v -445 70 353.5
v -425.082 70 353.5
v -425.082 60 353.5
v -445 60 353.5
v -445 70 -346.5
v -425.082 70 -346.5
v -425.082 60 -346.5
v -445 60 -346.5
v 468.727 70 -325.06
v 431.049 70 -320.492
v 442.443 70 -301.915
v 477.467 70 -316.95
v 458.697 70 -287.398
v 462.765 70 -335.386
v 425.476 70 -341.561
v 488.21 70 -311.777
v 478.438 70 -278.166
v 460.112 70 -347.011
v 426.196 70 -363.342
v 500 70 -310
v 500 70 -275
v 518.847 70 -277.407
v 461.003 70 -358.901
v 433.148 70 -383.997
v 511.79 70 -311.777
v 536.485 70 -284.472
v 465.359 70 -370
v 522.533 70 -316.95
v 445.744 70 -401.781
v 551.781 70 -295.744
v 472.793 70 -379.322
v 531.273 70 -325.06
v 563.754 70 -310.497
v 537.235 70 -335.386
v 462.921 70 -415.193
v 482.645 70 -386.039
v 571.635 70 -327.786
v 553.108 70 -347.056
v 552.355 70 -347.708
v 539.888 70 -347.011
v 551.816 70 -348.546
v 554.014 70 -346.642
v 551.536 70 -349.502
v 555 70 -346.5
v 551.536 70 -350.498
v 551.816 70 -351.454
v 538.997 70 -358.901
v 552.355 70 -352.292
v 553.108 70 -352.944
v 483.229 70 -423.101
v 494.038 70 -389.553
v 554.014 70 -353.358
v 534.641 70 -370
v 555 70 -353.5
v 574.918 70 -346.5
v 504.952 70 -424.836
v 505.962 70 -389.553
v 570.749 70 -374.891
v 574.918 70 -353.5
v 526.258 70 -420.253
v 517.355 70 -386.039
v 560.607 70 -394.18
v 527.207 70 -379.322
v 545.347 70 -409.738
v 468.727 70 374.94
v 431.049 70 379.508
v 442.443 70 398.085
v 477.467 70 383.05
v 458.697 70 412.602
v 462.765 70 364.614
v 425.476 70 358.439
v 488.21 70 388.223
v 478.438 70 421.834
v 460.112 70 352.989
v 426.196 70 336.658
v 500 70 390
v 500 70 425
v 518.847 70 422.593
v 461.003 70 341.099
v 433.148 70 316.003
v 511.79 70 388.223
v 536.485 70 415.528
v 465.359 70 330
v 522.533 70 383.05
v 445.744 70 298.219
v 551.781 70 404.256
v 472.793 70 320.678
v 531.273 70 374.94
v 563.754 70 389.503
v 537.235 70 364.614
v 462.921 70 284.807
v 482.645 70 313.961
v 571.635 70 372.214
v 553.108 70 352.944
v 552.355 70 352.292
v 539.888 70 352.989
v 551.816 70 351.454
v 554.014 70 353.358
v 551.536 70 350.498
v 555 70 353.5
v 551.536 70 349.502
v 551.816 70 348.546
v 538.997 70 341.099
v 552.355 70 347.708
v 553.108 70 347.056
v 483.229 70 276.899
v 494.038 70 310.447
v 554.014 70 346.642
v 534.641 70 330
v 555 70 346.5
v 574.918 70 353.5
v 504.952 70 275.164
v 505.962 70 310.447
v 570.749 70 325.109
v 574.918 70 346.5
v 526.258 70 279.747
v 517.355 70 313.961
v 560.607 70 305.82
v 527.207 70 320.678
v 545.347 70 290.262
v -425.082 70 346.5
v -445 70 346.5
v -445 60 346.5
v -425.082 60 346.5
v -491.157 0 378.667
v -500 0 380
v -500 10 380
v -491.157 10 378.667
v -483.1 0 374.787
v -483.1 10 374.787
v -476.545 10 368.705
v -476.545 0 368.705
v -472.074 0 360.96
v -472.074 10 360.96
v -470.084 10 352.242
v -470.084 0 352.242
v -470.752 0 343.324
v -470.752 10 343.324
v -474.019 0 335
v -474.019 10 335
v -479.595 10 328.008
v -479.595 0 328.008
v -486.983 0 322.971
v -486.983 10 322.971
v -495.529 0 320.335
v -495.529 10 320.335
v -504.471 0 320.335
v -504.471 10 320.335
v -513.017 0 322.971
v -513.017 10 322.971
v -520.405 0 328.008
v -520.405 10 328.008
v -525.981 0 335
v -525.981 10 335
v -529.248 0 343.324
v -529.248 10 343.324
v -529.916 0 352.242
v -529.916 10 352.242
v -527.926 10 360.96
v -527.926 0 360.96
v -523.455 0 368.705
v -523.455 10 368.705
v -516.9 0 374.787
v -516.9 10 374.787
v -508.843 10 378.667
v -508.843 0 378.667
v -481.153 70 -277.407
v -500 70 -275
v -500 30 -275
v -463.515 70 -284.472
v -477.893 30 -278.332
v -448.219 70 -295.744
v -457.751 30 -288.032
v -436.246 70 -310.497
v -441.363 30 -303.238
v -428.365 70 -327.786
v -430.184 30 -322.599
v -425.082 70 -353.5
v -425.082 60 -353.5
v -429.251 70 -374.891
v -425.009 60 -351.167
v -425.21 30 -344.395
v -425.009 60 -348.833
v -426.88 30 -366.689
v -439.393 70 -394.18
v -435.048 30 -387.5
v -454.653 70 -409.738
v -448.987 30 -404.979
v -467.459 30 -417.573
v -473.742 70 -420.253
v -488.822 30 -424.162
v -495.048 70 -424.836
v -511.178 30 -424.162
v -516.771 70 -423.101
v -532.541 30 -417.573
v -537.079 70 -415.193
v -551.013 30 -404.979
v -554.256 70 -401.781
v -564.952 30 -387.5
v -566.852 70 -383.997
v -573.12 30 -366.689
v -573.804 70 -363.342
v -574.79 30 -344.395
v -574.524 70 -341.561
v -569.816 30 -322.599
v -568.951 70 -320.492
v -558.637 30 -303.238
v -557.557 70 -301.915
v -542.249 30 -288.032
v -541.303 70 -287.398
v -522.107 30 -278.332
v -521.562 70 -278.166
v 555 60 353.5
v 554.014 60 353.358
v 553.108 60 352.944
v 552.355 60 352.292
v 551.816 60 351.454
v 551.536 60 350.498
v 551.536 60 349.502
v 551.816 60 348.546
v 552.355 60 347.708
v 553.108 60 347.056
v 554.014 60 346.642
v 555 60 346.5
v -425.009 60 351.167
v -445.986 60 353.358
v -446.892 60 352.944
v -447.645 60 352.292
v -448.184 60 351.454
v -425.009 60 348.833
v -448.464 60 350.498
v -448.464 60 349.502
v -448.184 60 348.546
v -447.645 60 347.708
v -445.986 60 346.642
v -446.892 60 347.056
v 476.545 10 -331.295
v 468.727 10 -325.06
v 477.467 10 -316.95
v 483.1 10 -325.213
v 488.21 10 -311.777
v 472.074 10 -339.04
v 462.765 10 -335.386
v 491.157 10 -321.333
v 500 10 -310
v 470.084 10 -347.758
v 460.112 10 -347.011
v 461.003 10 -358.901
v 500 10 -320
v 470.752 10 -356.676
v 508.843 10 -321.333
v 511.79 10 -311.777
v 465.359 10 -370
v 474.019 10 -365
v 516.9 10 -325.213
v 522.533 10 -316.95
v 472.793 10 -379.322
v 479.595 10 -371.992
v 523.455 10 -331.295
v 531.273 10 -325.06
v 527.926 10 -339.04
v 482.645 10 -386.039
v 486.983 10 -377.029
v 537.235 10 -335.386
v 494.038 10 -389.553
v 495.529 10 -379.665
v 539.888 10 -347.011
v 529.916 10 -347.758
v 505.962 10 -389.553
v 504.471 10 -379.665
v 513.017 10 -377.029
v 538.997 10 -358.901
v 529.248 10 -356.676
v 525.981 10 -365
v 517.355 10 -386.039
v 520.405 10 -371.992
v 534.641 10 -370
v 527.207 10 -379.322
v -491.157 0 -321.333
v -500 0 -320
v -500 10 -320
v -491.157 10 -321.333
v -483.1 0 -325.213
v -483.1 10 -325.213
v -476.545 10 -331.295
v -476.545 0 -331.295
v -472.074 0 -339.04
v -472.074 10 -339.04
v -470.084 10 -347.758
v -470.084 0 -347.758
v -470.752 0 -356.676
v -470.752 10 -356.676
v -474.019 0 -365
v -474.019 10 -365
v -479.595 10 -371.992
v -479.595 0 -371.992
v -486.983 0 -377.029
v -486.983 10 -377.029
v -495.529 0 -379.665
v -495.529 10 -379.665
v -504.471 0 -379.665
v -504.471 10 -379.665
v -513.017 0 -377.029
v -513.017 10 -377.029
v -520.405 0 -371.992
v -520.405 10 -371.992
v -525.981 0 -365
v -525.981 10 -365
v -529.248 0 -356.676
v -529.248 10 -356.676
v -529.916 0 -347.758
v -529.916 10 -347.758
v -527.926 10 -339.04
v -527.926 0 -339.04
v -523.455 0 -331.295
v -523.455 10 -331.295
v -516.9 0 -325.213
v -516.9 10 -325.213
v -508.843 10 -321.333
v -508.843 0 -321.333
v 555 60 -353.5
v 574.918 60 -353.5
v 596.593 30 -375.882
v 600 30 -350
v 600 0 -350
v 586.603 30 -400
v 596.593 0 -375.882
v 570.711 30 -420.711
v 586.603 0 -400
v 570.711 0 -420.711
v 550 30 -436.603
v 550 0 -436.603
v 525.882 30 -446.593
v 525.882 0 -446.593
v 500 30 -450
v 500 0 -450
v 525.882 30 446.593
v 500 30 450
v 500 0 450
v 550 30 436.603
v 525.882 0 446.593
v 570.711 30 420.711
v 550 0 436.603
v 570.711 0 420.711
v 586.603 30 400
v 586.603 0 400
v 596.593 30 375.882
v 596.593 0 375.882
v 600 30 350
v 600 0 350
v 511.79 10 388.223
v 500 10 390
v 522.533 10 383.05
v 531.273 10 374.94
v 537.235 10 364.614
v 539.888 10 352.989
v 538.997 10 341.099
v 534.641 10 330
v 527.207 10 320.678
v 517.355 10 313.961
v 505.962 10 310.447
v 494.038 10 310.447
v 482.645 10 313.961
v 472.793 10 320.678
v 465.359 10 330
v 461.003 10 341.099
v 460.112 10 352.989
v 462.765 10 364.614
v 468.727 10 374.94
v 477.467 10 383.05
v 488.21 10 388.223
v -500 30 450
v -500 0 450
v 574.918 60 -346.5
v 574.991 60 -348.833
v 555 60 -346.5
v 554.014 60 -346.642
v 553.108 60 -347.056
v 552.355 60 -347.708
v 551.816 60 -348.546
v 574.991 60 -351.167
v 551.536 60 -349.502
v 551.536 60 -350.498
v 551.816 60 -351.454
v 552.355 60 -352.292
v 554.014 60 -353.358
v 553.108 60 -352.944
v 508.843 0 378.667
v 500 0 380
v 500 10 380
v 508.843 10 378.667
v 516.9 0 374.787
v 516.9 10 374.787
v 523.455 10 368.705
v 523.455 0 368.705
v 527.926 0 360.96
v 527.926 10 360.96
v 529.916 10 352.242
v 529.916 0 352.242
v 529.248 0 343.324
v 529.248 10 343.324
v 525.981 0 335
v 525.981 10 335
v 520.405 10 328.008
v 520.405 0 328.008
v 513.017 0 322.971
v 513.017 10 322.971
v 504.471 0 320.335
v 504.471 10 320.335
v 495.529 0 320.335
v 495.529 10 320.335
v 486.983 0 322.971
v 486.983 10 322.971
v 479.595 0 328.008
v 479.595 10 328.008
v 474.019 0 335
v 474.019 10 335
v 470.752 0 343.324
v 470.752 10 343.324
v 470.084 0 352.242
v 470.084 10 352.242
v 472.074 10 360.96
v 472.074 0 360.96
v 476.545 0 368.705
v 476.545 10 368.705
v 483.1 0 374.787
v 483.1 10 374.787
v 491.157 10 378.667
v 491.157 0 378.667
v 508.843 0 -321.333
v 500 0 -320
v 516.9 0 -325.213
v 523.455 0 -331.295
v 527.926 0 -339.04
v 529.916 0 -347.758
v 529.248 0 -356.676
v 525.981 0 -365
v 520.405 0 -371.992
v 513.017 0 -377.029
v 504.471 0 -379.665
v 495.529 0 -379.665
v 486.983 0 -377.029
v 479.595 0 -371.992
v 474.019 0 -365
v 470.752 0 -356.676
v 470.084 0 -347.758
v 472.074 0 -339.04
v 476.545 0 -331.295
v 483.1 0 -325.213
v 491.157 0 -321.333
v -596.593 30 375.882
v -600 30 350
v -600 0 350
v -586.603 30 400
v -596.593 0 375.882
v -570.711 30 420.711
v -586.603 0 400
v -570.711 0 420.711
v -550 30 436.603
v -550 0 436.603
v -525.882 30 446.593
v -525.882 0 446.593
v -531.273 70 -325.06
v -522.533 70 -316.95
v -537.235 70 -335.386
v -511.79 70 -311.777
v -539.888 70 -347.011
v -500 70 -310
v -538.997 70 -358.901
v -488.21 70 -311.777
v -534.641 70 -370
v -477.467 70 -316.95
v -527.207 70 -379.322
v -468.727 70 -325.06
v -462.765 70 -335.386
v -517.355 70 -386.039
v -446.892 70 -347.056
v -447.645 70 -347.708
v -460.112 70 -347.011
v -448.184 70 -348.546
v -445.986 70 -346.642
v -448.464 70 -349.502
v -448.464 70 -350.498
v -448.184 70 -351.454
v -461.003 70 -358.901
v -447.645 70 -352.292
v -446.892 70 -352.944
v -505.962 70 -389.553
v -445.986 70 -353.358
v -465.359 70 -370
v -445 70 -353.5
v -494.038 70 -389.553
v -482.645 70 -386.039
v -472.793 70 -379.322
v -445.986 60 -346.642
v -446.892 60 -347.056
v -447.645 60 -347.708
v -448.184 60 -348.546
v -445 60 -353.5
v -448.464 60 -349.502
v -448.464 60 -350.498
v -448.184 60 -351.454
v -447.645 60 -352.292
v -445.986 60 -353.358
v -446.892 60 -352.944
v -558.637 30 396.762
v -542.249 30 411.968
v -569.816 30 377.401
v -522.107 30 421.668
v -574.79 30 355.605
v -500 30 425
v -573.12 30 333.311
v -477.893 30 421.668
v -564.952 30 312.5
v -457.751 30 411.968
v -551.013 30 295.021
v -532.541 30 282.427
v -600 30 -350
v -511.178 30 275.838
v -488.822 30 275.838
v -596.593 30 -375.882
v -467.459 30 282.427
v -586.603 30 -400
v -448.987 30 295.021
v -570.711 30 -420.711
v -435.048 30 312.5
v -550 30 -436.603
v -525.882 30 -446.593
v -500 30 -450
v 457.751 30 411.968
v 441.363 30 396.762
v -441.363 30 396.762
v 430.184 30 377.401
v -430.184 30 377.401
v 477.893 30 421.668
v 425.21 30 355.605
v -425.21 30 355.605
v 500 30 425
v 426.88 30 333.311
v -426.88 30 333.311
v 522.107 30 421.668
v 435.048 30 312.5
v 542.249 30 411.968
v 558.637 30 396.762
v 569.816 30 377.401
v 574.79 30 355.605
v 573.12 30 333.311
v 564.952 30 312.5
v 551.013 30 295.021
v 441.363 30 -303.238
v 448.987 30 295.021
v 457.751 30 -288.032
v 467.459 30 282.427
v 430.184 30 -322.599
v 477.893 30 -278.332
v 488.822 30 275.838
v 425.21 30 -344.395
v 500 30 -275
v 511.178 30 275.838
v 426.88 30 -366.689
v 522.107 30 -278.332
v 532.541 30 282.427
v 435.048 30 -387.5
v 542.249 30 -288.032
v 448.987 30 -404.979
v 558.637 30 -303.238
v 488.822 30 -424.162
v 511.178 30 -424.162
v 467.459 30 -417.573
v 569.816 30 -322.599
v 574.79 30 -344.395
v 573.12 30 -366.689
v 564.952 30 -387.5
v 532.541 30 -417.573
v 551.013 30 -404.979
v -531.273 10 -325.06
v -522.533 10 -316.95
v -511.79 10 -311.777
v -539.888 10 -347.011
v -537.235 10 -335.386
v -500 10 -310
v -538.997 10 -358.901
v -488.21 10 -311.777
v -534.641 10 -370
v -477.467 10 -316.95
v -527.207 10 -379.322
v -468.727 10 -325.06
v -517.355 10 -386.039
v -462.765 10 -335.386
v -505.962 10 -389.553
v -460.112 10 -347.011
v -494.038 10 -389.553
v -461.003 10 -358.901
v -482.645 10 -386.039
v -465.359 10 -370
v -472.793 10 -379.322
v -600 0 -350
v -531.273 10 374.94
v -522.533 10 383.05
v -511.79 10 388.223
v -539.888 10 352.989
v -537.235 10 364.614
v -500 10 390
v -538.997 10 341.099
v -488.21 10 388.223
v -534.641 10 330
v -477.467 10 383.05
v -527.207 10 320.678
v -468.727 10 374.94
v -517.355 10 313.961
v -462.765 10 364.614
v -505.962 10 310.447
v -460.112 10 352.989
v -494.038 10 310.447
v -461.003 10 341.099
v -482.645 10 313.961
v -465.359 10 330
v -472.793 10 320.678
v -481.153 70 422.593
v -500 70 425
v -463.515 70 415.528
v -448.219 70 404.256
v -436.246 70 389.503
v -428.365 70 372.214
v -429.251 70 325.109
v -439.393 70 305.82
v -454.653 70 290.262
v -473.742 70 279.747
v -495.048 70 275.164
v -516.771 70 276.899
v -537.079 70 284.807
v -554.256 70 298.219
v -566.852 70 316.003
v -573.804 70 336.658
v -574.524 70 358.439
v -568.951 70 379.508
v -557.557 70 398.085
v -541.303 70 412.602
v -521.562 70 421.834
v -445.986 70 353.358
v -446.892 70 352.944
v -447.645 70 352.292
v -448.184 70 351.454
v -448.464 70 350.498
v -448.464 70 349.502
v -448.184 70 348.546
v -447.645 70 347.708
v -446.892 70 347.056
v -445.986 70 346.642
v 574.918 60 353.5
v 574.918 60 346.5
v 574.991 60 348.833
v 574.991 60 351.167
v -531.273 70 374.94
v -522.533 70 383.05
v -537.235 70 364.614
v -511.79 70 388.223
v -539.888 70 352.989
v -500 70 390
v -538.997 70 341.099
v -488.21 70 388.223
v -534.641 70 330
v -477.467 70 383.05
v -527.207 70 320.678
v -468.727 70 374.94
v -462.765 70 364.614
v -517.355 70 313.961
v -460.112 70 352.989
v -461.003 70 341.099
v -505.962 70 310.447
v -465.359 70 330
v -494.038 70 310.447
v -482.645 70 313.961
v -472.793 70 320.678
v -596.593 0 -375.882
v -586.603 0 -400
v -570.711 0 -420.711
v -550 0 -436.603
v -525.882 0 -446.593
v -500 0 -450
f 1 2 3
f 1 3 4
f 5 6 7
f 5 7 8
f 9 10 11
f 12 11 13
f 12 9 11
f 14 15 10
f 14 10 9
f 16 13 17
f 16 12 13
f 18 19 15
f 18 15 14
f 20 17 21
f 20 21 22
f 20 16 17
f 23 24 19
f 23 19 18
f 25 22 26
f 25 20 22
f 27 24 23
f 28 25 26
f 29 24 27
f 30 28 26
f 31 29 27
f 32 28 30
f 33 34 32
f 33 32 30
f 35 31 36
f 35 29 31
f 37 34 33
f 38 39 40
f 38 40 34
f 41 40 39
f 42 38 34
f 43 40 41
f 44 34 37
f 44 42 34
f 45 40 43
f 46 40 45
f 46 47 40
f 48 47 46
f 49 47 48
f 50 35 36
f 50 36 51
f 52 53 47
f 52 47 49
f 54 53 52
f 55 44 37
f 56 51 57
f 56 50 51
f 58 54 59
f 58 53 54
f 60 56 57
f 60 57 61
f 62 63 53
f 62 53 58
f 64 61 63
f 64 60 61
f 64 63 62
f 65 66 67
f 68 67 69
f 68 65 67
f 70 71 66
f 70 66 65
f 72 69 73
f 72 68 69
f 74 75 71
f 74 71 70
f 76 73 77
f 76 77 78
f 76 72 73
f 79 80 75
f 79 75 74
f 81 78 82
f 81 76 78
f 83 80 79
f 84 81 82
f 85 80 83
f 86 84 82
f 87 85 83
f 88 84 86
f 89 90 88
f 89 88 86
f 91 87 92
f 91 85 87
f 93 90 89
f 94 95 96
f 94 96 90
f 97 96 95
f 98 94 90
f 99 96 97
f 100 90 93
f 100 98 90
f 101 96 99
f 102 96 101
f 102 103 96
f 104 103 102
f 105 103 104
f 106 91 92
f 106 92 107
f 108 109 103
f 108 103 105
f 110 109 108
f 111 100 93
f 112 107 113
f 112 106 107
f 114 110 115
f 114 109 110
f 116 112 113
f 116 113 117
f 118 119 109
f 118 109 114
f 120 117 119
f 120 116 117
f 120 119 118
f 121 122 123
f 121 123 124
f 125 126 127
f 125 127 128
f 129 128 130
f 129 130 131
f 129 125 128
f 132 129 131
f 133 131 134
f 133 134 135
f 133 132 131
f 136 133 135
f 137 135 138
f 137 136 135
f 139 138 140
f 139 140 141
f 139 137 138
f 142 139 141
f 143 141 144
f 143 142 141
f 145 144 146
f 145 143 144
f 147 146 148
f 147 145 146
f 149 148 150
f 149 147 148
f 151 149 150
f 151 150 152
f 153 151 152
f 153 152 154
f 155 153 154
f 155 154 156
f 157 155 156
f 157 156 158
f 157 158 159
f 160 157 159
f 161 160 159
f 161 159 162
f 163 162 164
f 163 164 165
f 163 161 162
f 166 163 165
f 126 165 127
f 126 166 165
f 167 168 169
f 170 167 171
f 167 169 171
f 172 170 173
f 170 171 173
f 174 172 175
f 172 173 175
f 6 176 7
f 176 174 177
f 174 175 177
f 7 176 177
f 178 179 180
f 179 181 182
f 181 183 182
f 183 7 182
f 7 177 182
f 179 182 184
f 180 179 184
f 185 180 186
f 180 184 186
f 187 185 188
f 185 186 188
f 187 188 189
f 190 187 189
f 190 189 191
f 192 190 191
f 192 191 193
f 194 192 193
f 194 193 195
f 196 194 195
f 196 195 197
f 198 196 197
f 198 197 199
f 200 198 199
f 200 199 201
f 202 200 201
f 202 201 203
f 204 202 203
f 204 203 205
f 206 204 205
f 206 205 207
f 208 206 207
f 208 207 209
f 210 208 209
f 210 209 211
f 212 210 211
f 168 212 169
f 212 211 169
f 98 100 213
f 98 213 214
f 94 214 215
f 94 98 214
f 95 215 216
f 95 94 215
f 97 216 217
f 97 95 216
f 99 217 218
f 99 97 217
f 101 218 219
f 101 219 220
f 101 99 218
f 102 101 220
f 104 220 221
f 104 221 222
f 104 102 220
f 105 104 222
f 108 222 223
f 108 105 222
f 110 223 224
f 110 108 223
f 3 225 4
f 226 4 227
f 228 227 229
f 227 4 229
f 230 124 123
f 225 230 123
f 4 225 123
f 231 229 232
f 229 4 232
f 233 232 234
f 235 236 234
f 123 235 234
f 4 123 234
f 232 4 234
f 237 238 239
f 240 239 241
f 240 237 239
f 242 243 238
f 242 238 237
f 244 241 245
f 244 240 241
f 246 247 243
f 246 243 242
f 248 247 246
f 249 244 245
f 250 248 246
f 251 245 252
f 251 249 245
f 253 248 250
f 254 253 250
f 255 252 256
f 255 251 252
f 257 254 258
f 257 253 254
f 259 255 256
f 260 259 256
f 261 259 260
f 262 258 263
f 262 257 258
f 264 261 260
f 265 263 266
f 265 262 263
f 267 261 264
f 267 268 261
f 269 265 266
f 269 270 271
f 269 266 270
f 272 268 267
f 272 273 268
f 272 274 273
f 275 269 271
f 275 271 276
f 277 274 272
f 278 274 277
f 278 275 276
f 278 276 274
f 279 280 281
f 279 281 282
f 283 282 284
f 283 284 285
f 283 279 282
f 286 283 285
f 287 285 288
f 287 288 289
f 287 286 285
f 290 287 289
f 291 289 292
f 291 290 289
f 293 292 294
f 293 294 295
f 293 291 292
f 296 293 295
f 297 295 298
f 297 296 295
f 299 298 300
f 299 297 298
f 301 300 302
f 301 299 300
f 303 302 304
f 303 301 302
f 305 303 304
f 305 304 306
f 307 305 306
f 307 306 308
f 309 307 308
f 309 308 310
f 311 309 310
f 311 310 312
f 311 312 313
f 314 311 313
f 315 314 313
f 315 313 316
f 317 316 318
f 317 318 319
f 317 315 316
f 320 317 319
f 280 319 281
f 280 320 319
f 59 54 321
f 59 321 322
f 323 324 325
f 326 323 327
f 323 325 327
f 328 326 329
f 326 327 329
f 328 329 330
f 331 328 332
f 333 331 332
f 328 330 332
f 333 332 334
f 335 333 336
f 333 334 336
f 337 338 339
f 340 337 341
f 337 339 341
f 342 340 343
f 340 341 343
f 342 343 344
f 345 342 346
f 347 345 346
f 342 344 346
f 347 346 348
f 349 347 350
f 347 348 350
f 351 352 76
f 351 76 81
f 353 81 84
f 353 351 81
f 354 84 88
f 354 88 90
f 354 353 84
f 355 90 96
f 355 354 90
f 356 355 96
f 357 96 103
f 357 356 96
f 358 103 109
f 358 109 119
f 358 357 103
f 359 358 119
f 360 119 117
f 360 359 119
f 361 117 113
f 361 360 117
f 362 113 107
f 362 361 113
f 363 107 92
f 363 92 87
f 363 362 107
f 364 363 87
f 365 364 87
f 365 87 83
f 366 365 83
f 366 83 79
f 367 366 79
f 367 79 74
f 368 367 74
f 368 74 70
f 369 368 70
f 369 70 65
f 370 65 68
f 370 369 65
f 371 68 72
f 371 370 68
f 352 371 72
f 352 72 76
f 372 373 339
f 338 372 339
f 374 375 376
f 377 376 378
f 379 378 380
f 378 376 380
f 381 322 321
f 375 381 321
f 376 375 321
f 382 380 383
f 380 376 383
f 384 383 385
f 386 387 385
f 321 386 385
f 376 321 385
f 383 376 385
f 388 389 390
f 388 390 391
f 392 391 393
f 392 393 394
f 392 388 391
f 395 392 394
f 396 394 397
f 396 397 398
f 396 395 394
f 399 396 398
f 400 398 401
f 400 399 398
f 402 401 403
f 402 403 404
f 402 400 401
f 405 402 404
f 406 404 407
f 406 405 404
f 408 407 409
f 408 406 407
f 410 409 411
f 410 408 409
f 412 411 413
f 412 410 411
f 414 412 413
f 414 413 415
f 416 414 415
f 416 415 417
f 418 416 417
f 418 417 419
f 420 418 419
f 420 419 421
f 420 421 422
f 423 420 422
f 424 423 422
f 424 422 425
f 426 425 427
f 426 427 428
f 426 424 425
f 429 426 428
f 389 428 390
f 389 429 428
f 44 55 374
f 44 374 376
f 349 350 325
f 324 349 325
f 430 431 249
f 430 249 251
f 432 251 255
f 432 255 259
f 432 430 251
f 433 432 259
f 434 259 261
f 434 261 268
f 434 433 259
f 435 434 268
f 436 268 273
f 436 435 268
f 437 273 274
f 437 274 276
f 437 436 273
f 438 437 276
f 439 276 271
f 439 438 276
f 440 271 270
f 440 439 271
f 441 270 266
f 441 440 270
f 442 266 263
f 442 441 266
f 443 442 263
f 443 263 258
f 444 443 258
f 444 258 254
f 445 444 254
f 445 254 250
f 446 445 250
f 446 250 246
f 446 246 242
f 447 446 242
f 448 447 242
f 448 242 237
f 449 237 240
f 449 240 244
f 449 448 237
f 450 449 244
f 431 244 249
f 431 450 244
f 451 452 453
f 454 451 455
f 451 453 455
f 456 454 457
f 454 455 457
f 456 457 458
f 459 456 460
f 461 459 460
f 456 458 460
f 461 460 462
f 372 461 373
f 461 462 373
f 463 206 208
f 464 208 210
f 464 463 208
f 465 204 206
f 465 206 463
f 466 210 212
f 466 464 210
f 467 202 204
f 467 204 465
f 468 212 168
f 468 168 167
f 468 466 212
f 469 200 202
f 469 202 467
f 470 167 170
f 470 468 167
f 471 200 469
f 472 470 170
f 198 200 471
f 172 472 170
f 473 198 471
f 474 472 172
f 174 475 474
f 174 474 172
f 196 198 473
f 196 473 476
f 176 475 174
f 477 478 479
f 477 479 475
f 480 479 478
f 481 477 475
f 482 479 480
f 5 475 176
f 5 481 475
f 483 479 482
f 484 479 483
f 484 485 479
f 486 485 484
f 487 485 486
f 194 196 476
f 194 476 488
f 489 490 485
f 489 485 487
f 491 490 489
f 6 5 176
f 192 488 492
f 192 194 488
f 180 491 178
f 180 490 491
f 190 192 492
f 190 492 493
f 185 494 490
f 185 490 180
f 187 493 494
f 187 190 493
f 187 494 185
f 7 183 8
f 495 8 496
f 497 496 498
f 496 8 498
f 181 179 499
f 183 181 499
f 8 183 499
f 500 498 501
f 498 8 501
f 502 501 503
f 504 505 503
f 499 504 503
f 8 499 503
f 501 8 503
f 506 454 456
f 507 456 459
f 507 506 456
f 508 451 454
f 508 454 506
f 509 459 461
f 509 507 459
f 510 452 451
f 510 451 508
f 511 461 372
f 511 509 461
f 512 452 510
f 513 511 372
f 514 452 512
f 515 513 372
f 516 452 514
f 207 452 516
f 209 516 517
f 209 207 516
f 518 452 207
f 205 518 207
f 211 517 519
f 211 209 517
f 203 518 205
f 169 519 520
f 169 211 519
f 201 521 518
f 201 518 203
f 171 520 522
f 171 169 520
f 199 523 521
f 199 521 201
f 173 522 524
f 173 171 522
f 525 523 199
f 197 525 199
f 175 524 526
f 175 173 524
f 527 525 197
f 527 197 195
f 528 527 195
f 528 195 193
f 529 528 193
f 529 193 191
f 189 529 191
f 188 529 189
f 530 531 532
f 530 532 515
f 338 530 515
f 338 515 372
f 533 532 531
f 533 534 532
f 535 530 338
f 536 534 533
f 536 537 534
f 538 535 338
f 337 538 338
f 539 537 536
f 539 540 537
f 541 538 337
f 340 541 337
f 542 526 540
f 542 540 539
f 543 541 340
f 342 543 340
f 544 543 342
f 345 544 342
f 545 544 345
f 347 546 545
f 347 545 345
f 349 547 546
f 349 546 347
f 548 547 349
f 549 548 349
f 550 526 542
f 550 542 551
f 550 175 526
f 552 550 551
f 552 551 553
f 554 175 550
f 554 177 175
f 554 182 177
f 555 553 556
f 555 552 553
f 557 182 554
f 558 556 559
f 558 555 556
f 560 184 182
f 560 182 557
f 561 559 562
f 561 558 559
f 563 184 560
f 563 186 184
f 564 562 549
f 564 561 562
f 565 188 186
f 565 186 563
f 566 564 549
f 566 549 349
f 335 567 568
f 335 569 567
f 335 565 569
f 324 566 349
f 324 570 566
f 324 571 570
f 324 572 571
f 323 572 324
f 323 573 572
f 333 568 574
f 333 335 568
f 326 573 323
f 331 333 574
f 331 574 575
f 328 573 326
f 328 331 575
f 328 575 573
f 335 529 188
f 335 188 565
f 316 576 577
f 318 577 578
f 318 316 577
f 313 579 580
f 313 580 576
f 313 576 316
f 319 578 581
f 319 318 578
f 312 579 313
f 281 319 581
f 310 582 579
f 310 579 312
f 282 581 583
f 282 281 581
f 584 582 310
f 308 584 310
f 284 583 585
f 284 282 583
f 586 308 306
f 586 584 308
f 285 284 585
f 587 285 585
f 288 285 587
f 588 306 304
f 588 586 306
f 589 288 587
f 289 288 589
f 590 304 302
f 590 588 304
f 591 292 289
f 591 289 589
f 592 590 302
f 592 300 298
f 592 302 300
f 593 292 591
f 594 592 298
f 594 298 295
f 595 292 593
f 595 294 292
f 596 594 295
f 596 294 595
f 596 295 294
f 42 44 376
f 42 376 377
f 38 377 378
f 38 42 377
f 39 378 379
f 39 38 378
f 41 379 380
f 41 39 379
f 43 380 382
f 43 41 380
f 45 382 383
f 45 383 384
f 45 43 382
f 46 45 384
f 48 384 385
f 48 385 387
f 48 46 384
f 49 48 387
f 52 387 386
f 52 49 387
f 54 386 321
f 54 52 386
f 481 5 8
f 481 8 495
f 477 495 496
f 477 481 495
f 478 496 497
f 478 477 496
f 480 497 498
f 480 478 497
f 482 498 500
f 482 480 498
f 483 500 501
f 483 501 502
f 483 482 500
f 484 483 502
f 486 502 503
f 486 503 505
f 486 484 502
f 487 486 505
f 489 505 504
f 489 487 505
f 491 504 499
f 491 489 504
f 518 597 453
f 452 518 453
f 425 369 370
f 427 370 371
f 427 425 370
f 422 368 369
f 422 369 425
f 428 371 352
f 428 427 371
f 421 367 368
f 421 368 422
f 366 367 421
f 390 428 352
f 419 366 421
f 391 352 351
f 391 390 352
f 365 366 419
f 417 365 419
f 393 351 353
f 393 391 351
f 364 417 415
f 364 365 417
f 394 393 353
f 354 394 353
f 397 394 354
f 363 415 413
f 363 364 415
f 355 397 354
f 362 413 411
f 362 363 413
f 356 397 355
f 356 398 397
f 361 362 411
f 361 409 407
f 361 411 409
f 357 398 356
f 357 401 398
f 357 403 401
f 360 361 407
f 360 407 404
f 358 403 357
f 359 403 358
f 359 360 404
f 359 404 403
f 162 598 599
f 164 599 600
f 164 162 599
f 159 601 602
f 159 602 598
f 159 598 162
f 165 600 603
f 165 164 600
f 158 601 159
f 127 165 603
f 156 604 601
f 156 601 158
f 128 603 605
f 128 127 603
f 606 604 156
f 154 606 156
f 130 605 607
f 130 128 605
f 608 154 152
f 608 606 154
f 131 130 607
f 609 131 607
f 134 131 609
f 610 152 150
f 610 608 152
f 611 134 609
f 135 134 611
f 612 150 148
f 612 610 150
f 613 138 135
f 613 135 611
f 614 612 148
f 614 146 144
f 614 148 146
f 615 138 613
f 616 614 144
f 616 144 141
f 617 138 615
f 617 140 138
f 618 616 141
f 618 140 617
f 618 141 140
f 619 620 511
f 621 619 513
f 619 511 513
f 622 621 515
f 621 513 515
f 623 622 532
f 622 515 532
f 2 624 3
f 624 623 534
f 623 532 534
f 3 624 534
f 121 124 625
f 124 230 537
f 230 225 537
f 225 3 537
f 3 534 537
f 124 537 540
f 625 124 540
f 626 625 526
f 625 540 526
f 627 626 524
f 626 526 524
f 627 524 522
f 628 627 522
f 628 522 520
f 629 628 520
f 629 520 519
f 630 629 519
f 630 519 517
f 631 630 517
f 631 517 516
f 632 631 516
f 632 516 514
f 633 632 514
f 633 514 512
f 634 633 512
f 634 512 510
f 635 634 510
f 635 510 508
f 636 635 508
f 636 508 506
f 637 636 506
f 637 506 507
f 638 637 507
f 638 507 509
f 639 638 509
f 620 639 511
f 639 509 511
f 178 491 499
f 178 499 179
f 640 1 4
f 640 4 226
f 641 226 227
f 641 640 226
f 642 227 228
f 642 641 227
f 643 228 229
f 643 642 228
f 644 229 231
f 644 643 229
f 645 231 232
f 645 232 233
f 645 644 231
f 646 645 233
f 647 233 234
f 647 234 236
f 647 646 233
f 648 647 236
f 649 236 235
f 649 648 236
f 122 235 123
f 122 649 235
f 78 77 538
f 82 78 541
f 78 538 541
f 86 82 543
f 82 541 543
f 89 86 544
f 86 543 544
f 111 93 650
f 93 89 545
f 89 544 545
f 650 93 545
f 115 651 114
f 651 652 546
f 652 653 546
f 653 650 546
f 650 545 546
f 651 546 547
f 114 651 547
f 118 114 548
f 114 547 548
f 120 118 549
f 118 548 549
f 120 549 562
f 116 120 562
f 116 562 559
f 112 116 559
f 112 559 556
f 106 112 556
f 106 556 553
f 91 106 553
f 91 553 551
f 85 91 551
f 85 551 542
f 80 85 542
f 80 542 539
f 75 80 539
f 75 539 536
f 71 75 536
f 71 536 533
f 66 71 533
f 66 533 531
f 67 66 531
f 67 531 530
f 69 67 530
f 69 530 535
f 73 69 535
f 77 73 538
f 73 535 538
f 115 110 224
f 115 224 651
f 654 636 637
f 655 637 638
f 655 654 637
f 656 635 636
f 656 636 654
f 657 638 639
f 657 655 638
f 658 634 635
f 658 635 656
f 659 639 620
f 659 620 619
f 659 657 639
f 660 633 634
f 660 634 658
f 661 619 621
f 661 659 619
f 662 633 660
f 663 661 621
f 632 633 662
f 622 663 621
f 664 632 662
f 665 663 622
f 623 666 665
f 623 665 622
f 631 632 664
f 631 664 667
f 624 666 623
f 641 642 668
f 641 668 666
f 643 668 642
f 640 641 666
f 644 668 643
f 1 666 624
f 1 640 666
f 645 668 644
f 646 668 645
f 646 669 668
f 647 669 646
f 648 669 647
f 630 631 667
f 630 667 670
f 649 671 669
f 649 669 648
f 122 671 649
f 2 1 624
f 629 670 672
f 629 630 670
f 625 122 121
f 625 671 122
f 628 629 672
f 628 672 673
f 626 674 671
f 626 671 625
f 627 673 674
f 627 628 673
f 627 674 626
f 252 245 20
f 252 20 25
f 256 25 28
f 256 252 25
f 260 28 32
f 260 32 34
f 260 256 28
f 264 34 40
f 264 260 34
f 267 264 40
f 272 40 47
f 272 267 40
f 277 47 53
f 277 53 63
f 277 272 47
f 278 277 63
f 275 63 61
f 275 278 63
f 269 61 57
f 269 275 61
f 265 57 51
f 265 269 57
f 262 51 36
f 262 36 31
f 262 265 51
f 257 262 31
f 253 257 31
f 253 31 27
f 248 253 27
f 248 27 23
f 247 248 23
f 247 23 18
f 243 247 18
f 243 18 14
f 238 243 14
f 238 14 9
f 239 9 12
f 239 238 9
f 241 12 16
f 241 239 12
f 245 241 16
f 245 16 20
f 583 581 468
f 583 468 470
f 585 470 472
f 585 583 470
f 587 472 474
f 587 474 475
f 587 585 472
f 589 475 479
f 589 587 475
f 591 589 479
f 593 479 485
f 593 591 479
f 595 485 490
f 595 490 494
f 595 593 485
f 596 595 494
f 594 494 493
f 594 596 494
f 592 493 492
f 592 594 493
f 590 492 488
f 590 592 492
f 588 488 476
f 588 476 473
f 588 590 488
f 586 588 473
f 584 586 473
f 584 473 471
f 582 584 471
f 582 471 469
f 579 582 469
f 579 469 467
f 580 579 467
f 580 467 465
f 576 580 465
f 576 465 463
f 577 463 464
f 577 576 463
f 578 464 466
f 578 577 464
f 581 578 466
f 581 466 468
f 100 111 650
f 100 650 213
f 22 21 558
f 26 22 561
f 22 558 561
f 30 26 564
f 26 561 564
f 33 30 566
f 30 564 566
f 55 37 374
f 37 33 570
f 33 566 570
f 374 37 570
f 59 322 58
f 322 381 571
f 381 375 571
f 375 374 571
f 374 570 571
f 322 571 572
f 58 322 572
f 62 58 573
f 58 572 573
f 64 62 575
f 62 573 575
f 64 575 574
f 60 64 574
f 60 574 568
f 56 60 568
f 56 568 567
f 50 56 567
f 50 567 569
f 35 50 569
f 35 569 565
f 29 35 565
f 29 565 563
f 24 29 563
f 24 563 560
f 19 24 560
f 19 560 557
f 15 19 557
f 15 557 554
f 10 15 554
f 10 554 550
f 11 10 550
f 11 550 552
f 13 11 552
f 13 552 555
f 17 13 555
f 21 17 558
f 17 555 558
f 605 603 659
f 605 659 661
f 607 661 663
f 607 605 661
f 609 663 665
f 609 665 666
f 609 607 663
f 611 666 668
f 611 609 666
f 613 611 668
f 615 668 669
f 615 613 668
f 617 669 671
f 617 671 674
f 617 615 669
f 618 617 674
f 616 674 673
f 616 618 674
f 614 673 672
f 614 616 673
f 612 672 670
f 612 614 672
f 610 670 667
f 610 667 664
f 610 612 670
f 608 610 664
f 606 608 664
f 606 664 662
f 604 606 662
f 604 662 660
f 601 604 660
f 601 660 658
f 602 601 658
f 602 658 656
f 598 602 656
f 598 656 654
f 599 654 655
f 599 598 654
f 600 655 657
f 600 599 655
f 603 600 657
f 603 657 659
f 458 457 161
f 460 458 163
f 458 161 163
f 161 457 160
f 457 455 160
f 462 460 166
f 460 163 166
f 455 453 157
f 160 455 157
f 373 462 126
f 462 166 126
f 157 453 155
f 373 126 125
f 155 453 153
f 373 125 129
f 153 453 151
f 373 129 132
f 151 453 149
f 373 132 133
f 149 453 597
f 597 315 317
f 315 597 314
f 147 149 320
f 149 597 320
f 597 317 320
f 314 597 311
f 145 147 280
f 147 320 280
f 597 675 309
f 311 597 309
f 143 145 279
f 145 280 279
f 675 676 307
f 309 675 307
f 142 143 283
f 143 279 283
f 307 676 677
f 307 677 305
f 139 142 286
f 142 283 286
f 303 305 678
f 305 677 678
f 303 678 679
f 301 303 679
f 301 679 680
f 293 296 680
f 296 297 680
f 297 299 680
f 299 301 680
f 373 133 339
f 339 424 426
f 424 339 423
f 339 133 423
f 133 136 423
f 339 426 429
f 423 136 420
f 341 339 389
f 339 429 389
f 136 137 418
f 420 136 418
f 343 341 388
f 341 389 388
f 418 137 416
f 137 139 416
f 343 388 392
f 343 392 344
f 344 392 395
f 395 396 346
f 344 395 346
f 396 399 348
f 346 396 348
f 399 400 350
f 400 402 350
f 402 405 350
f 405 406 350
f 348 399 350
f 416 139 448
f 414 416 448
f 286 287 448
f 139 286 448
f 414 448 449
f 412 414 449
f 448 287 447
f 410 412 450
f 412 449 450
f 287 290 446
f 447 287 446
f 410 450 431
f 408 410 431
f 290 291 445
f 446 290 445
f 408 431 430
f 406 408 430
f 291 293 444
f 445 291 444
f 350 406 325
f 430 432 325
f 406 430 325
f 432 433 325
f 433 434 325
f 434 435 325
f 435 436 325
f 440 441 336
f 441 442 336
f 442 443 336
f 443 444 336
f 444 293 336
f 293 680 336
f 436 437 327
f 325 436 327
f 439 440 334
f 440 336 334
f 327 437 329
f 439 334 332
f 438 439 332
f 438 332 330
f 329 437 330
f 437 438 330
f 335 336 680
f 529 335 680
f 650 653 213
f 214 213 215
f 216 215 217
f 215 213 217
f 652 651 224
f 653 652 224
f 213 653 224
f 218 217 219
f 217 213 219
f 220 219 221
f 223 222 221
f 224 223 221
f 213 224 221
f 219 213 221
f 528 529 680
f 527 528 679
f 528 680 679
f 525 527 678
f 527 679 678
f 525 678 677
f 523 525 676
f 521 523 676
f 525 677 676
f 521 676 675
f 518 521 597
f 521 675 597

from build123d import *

# Parameters (mm, degrees)
SKETCH_1_R          = 30
EXTRUDE_1_DEPTH     = 10
SKETCH_2_R          = 40
EXTRUDE_2_DEPTH     = 60
CUT_EXTRUDE_START   = -40
SKETCH_3_R          = 75
CUT_EXTRUDE_1_DEPTH = 40
CUT_EXTRUDE_2_DEPTH = 10


with BuildPart() as part:
    # 草图1 → 凸台-拉伸1 (new body)
    with BuildSketch(Plane(origin=(0, 0, 0), x_dir=(1, 0, 0), z_dir=(0, 1, 0))):
        with BuildLine():
            Line((-500, -450), (500, -450))
            ThreePointArc((500, -450), (570.710678119, -420.710678119), (600, -350))
            Line((600, -350), (600, 350))
            ThreePointArc((600, 350), (570.710678119, 420.710678119), (500, 450))
            Line((500, 450), (-500, 450))
            ThreePointArc((-500, 450), (-570.710678119, 420.710678119), (-600, 350))
            Line((-600, 350), (-600, -350))
            ThreePointArc((-600, -350), (-570.710678119, -420.710678119), (-500, -450))
        make_face()
        with Locations((-500, 350)):
            Circle(SKETCH_1_R, mode=Mode.SUBTRACT)
        with Locations((500, 350)):
            Circle(SKETCH_1_R, mode=Mode.SUBTRACT)
        with Locations((-500, -350)):
            Circle(SKETCH_1_R, mode=Mode.SUBTRACT)
        with Locations((500, -350)):
            Circle(SKETCH_1_R, mode=Mode.SUBTRACT)
    extrude(amount=EXTRUDE_1_DEPTH)

    # 草图2 → 凸台-拉伸2 (add)
    with BuildSketch(Plane(origin=(0, 10, 0), x_dir=(1, 0, 0), z_dir=(0, 1, 0))):
        with BuildLine():
            Line((600, -350), (600, 350))
            ThreePointArc((600, 350), (570.710678119, 420.710678119), (500, 450))
            Line((500, 450), (-500, 450))
            ThreePointArc((-500, 450), (-570.710678119, 420.710678119), (-600, 350))
            Line((-600, 350), (-600, -350))
            ThreePointArc((-600, -350), (-570.710678119, -420.710678119), (-500, -450))
            Line((-500, -450), (500, -450))
            ThreePointArc((500, -450), (570.710678119, -420.710678119), (600, -350))
        make_face()
        with Locations((-500, 350)):
            Circle(SKETCH_2_R, mode=Mode.SUBTRACT)
        with Locations((-500, -350)):
            Circle(SKETCH_2_R, mode=Mode.SUBTRACT)
        with Locations((500, -350)):
            Circle(SKETCH_2_R, mode=Mode.SUBTRACT)
        with Locations((500, 350)):
            Circle(SKETCH_2_R, mode=Mode.SUBTRACT)
    extrude(amount=EXTRUDE_2_DEPTH)

    # 草图3 → 切除-拉伸1 (cut)
    with BuildSketch(Plane(origin=(0, 70, 0), x_dir=(1, 0, 0), z_dir=(0, 1, 0)).offset(CUT_EXTRUDE_START)):
        with BuildLine():
            Line((600, -350), (600, 350))
            ThreePointArc((600, 350), (570.710678119, 420.710678119), (500, 450))
            Line((500, 450), (-500, 450))
            ThreePointArc((-500, 450), (-570.710678119, 420.710678119), (-600, 350))
            Line((-600, 350), (-600, -350))
            ThreePointArc((-600, -350), (-570.710678119, -420.710678119), (-500, -450))
            Line((-500, -450), (500, -450))
            ThreePointArc((500, -450), (570.710678119, -420.710678119), (600, -350))
        make_face()
        with Locations((-500, 350)):
            Circle(SKETCH_3_R, mode=Mode.SUBTRACT)
        with Locations((-500, -350)):
            Circle(SKETCH_3_R, mode=Mode.SUBTRACT)
        with Locations((500, 350)):
            Circle(SKETCH_3_R, mode=Mode.SUBTRACT)
        with Locations((500, -350)):
            Circle(SKETCH_3_R, mode=Mode.SUBTRACT)
    extrude(amount=CUT_EXTRUDE_1_DEPTH, mode=Mode.SUBTRACT)

    # 草图7 → 切除-拉伸2 (cut)
    with BuildSketch(Plane(origin=(0, 70, 0), x_dir=(1, 0, 0), z_dir=(0, 1, 0))):
        with BuildLine():
            Line((-425, 346.5), (-445, 346.5))
            ThreePointArc((-445, 346.5), (-448.5, 350), (-445, 353.5))
            Line((-445, 353.5), (-425, 353.5))
            ThreePointArc((-425, 353.5), (-421.5, 350), (-425, 346.5))
        make_face()
        with BuildLine():
            Line((575, 346.5), (555, 346.5))
            ThreePointArc((555, 346.5), (551.5, 350), (555, 353.5))
            Line((555, 353.5), (575, 353.5))
            ThreePointArc((575, 353.5), (578.5, 350), (575, 346.5))
        make_face()
        with BuildLine():
            Line((575, -353.5), (555, -353.5))
            ThreePointArc((555, -353.5), (551.5, -350), (555, -346.5))
            Line((555, -346.5), (575, -346.5))
            ThreePointArc((575, -346.5), (578.5, -350), (575, -353.5))
        make_face()
        with BuildLine():
            Line((-425, -353.5), (-445, -353.5))
            ThreePointArc((-445, -353.5), (-448.5, -350), (-445, -346.5))
            Line((-445, -346.5), (-425, -346.5))
            ThreePointArc((-425, -346.5), (-421.5, -350), (-425, -353.5))
        make_face()
    extrude(amount=-CUT_EXTRUDE_2_DEPTH, mode=Mode.SUBTRACT)


solid = part.part
